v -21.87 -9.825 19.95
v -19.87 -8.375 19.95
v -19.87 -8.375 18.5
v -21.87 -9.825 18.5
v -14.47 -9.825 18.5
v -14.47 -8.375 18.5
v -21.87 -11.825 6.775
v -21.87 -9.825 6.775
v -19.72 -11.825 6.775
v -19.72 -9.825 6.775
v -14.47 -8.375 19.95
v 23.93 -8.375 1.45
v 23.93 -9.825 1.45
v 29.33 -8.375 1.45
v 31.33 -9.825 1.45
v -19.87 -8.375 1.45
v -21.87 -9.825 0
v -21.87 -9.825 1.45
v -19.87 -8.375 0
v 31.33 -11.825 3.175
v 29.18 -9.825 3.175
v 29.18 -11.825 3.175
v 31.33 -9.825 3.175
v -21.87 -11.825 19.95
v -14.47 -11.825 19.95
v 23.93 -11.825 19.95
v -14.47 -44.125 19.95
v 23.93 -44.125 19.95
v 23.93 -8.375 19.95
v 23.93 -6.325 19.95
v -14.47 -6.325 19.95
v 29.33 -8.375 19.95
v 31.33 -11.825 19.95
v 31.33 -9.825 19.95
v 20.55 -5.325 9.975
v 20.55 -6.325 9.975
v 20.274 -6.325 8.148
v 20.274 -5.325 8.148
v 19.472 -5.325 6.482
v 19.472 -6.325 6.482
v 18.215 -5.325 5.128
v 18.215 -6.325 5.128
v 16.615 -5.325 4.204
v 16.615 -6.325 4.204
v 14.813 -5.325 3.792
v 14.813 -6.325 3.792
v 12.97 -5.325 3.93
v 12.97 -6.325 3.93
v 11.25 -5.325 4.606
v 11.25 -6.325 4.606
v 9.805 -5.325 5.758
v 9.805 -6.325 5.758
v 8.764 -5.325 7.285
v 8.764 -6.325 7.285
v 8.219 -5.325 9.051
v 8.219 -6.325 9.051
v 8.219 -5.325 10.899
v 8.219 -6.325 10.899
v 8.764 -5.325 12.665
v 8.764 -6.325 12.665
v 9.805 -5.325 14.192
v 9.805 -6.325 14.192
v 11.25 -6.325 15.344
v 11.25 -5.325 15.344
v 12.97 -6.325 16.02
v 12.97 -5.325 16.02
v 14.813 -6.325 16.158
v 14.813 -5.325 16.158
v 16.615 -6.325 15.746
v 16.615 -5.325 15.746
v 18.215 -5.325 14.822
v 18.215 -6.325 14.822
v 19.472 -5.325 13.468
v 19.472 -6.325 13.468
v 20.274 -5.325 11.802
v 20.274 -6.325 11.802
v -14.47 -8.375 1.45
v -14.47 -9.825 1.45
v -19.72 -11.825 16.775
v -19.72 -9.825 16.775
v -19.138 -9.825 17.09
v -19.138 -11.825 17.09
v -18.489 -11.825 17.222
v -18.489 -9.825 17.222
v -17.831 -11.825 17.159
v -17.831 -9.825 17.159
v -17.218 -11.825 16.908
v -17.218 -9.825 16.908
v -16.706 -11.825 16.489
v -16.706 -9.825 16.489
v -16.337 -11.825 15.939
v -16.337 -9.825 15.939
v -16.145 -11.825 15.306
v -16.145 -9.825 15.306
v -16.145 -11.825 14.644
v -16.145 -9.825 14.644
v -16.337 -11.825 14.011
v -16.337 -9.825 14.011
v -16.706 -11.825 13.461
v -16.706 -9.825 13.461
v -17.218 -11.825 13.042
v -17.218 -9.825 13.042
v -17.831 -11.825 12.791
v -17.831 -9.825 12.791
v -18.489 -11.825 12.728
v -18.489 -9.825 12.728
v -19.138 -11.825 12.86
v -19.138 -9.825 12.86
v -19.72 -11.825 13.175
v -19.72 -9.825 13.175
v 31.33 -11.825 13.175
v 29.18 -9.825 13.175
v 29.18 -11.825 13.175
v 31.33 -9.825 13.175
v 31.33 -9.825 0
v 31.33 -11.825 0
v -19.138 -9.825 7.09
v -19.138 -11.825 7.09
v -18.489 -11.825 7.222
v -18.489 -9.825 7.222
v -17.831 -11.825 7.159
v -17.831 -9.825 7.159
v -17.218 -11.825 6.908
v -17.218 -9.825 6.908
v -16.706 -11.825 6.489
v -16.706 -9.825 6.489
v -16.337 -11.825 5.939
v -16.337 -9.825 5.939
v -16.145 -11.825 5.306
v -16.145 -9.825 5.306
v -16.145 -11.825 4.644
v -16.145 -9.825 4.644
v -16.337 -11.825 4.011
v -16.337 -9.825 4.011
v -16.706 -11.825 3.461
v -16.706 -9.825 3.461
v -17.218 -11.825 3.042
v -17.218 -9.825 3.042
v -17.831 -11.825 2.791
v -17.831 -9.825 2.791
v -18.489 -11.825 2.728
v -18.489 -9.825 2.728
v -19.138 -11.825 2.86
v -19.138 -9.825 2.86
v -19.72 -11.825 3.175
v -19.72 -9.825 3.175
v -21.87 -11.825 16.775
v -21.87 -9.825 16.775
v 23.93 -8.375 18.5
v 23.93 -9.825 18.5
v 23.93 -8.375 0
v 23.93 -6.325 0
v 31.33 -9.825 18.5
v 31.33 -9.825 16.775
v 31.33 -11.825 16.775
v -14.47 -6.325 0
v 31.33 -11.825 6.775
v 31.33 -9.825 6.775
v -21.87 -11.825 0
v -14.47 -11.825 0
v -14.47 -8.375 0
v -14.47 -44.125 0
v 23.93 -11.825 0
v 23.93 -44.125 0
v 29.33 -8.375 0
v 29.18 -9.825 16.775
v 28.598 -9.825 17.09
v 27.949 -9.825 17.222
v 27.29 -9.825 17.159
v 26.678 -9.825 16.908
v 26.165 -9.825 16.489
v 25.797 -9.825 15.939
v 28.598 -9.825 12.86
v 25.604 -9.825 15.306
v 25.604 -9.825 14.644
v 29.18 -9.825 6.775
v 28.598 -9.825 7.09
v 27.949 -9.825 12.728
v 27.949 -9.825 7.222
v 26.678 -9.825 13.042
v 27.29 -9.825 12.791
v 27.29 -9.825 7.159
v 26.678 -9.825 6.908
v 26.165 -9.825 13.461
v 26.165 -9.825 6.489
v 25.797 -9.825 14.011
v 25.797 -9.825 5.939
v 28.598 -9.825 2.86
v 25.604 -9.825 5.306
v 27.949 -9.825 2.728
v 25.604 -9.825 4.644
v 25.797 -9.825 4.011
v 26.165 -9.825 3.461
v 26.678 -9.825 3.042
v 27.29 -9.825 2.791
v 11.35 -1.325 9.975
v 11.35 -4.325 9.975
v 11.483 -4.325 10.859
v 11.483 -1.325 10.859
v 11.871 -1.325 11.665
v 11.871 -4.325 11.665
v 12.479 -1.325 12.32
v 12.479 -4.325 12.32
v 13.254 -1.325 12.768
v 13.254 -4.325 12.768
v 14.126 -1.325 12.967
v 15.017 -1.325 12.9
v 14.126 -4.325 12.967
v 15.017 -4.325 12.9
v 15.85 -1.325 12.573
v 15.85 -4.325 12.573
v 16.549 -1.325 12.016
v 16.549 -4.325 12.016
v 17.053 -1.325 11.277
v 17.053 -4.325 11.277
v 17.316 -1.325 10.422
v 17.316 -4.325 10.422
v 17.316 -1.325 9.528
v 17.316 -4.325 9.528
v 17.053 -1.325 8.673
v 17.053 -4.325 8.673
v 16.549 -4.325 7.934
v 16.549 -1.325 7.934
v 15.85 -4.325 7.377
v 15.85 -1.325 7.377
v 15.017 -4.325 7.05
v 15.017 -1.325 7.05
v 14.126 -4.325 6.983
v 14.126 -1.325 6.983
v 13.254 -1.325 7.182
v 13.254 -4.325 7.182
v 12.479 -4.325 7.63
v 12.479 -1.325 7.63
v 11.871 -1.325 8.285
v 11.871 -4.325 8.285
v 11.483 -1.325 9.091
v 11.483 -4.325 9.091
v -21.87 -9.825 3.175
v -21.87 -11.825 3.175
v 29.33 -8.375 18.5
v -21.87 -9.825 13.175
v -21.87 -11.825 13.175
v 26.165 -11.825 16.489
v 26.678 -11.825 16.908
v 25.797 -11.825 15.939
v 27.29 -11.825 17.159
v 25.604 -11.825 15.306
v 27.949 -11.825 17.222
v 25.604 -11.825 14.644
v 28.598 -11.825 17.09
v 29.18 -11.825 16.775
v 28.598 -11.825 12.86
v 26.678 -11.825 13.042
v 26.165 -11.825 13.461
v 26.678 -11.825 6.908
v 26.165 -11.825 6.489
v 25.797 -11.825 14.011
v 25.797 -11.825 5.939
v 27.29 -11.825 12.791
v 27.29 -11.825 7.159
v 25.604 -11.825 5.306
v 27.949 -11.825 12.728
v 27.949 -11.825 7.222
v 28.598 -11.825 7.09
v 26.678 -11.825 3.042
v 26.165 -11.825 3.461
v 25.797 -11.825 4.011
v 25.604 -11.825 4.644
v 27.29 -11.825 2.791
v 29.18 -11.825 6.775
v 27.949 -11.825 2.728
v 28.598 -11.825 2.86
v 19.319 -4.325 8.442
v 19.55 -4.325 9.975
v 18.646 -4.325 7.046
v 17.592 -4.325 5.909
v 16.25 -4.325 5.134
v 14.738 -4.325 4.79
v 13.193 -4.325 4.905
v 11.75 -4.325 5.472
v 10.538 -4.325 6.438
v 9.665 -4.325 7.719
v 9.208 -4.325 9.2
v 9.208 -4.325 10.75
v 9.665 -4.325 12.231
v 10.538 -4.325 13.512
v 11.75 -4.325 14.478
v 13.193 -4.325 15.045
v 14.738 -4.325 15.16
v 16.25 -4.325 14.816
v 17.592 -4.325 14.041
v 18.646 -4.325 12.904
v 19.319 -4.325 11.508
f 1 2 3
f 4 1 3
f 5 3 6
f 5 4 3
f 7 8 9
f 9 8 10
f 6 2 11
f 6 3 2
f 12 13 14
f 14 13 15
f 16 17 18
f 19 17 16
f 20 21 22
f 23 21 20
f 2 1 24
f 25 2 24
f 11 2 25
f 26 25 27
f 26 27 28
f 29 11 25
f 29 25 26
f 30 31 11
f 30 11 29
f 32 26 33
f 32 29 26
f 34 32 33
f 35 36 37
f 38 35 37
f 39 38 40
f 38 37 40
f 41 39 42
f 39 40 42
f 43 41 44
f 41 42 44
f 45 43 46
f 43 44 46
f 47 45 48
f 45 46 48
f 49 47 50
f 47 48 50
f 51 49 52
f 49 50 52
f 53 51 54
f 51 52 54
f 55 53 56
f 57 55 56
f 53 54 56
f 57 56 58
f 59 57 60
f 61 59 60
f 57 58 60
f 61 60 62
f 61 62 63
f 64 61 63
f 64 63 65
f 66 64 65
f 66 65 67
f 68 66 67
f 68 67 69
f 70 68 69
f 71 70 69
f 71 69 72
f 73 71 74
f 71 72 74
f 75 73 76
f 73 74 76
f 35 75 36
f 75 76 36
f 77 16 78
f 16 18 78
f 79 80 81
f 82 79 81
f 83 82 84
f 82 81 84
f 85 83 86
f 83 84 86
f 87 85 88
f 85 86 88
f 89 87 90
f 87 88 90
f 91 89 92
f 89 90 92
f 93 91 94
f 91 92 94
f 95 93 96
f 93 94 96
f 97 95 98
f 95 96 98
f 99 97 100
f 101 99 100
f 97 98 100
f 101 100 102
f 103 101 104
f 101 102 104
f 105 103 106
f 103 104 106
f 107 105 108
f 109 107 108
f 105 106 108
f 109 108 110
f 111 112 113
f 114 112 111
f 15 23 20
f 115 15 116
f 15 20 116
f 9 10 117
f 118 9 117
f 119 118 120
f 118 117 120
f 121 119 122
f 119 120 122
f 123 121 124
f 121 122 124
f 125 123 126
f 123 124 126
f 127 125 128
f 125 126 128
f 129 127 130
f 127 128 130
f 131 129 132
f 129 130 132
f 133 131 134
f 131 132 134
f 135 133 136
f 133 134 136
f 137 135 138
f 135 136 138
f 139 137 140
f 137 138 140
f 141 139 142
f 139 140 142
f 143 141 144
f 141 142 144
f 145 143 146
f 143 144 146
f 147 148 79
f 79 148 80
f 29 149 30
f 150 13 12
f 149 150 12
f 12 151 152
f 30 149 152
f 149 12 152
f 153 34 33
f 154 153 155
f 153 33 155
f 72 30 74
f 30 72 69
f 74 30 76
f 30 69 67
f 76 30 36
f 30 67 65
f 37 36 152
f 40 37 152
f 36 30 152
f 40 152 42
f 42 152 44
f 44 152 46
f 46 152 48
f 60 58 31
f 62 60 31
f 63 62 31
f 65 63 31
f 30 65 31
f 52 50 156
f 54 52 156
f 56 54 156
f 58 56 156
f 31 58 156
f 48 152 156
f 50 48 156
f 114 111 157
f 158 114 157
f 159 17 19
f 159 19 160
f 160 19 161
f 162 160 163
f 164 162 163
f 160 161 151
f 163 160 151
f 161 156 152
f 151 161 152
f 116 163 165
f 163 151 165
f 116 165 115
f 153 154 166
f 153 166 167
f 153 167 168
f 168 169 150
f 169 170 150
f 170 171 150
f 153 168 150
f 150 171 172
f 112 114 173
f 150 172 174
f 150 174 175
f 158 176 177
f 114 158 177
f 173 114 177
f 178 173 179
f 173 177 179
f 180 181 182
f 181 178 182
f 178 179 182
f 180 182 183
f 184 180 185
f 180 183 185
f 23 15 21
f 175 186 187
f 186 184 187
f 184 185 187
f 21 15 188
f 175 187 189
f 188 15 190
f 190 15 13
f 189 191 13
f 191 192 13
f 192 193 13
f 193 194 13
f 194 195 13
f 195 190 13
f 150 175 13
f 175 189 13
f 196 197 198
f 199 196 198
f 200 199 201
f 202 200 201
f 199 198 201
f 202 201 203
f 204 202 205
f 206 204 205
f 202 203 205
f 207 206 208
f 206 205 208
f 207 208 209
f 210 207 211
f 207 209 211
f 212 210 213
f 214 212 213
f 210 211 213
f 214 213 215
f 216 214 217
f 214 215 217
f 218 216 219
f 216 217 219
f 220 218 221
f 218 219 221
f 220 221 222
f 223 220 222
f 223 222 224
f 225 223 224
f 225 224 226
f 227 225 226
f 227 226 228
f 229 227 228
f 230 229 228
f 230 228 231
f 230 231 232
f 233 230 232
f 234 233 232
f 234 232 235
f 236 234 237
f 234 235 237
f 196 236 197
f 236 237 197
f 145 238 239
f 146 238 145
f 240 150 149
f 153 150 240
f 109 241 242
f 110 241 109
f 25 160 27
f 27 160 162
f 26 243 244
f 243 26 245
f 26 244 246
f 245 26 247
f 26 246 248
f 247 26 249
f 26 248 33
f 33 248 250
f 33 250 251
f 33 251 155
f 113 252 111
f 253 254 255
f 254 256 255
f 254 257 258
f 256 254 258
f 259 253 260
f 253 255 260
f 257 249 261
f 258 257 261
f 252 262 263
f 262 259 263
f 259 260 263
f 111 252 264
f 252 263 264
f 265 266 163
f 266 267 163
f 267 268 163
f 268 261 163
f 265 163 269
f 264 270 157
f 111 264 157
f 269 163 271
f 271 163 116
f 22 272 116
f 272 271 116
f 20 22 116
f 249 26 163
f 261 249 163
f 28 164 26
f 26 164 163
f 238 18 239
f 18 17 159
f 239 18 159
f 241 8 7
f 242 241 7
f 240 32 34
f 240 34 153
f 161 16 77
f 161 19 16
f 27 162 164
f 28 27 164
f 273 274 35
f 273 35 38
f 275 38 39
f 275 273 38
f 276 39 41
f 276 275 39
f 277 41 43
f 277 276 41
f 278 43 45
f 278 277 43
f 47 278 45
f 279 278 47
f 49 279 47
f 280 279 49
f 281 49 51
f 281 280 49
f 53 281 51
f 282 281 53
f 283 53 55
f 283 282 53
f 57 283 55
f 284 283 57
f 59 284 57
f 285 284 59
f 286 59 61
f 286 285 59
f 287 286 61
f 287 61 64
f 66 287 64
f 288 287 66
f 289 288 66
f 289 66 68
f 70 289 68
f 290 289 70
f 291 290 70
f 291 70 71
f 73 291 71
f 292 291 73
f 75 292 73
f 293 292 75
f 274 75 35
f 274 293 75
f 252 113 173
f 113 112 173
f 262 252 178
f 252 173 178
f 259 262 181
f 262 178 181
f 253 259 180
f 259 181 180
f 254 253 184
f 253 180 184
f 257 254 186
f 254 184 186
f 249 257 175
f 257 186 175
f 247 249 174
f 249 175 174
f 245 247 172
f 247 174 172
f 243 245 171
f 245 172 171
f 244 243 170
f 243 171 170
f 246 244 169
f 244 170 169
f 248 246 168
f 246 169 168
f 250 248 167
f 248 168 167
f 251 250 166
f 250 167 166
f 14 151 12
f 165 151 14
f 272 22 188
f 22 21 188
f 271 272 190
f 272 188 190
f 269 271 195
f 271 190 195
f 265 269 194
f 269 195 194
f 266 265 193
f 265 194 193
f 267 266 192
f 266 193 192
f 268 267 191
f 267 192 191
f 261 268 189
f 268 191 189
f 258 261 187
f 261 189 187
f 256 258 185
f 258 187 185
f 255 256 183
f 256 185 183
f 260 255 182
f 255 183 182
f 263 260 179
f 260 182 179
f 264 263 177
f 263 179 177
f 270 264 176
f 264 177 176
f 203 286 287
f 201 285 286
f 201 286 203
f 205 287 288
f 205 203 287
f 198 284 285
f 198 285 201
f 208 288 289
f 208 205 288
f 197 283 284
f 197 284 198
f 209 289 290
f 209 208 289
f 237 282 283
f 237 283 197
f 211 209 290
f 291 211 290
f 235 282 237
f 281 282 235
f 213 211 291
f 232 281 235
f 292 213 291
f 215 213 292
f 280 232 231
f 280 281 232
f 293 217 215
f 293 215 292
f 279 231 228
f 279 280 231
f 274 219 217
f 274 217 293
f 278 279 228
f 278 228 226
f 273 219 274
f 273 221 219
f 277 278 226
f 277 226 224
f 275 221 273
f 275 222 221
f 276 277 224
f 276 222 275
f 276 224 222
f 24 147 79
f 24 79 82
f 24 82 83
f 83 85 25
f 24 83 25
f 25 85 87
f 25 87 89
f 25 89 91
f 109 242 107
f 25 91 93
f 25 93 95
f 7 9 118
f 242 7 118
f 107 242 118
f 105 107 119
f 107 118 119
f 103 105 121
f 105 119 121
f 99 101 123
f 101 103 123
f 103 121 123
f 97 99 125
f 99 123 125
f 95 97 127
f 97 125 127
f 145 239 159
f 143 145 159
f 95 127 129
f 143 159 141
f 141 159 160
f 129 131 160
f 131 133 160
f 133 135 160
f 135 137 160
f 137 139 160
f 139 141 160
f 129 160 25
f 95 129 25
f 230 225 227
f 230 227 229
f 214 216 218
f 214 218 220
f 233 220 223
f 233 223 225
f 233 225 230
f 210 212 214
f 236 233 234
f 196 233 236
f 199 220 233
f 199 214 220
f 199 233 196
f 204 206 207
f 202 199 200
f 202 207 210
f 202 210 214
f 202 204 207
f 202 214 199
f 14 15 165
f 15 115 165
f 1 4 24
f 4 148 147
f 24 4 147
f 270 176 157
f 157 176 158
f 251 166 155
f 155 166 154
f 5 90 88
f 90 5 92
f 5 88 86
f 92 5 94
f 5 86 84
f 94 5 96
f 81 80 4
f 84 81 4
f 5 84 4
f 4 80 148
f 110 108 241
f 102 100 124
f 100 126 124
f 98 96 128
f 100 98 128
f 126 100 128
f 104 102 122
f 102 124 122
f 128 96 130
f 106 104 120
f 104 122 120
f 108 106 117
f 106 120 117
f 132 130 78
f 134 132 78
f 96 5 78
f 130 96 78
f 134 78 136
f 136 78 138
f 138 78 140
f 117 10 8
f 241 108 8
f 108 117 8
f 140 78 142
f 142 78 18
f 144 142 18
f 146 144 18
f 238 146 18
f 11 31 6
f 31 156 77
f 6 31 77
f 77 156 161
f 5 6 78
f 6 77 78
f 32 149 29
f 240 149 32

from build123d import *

# Parameters (mm, degrees)
EXTRUDE_1_DEPTH     = 19.95
SKETCH_2_W          = 7.4
SKETCH_2_H          = 1.45
EXTRUDE_2_DEPTH     = 1.45
CHAMFER_1_SIZE      = 1.45
CHAMFER_1_SIZE2     = 2
CHAMFER_3_SIZE      = 1.45
CHAMFER_3_SIZE2     = 2
CHAMFER_4_SIZE      = 1.45
CHAMFER_4_SIZE2     = 2
CHAMFER_5_SIZE      = 1.45
CHAMFER_5_SIZE2     = 2
SKETCH_3_R          = 2.25
CUT_EXTRUDE_1_DEPTH = 2
SKETCH_4_W          = 2.602143293
SKETCH_4_H          = 3.6
SKETCH_4_W_2        = 2.852203288
CUT_EXTRUDE_2_DEPTH = 2
SKETCH_5_R          = 6.2
EXTRUDE_3_DEPTH     = 2
CHAMFER_6_SIZE      = 1
SKETCH_6_R          = 3
EXTRUDE_4_DEPTH     = 3


with BuildPart() as part:
    # 草圖1 → 填料-伸長1 (new body)
    with BuildSketch(Plane.XY):
        Polygon((-14.470198675, -11.825165563), (-14.470198675, -44.125165563), (23.929801325, -44.125165563), (23.929801325, -11.825165563), (31.329801325, -11.825165563), (31.329801325, -9.825165563), (23.929801325, -9.825165563), (23.929801325, -6.325165563), (-14.470198675, -6.325165563), (-14.470198675, -9.825165563), (-21.870198675, -9.825165563), (-21.870198675, -11.825165563), align=None)
    extrude(amount=EXTRUDE_1_DEPTH)

    # 草圖2 → 填料-伸長2 (add)
    with BuildSketch(Plane(origin=(0, -9.825165563, 0), x_dir=(1, 0, 0), z_dir=(0, 1, 0))):
        with Locations((27.629801325, -0.725)):
            Rectangle(SKETCH_2_W, SKETCH_2_H)
        with Locations((27.629801325, -19.225)):
            Rectangle(SKETCH_2_W, SKETCH_2_H)
        with Locations((-18.170198675, -0.725)):
            Rectangle(SKETCH_2_W, SKETCH_2_H)
        with Locations((-18.170198675, -19.225)):
            Rectangle(SKETCH_2_W, SKETCH_2_H)
    extrude(amount=EXTRUDE_2_DEPTH)

    # 導角1
    chamfer_1_edges = [part.edges().sort_by_distance(p)[0] for p in [
        (31.329801325, -8.375165563, 19.225),
    ]]
    chamfer_1_side = [part.faces().sort_by_distance(p)[0] for p in [
        (31.329801325, -10.660702917, 9.975),
    ]]
    chamfer(chamfer_1_edges, length=CHAMFER_1_SIZE, length2=CHAMFER_1_SIZE2, reference=chamfer_1_side[0])

    # 導角3
    chamfer_3_edges = [part.edges().sort_by_distance(p)[0] for p in [
        (31.329801325, -8.375165563, 0.725),
    ]]
    chamfer_3_side = [part.faces().sort_by_distance(p)[0] for p in [
        (31.329801325, -10.738818024, 9.511976966),
    ]]
    chamfer(chamfer_3_edges, length=CHAMFER_3_SIZE, length2=CHAMFER_3_SIZE2, reference=chamfer_3_side[0])

    # 導角4
    chamfer_4_edges = [part.edges().sort_by_distance(p)[0] for p in [
        (-21.870198675, -8.375165563, 19.225),
    ]]
    chamfer_4_side = [part.faces().sort_by_distance(p)[0] for p in [
        (-21.870198675, -10.660702917, 9.975),
    ]]
    chamfer(chamfer_4_edges, length=CHAMFER_4_SIZE, length2=CHAMFER_4_SIZE2, reference=chamfer_4_side[0])

    # 導角5
    chamfer_5_edges = [part.edges().sort_by_distance(p)[0] for p in [
        (-21.870198675, -8.375165563, 0.725),
    ]]
    chamfer_5_side = [part.faces().sort_by_distance(p)[0] for p in [
        (-21.870198675, -10.738818024, 9.511976966),
    ]]
    chamfer(chamfer_5_edges, length=CHAMFER_5_SIZE, length2=CHAMFER_5_SIZE2, reference=chamfer_5_side[0])

    # 草圖3 → 除料-伸長1 (cut)
    with BuildSketch(Plane(origin=(0, -9.825165563, 0), x_dir=(1, 0, 0), z_dir=(0, 1, 0))):
        with Locations(Location((-18.370198675, -4.975, 0), (0, 0, 180))):
            Circle(SKETCH_3_R)
        with Locations(Location((-18.370198675, -14.975, 0), (0, 0, 180))):
            Circle(SKETCH_3_R)
        with Locations(Location((27.829801325, -14.975, 0), (0, 0, 180))):
            Circle(SKETCH_3_R)
        with Locations(Location((27.829801325, -4.975, 0), (0, 0, 180))):
            Circle(SKETCH_3_R)
    extrude(amount=-CUT_EXTRUDE_1_DEPTH, mode=Mode.SUBTRACT)

    # 草圖4 → 除料-伸長2 (cut)
    with BuildSketch(Plane(origin=(0, -9.825165563, 0), x_dir=(1, 0, 0), z_dir=(0, 1, 0))):
        with Locations((-20.569127028, -14.975)):
            Rectangle(SKETCH_4_W, SKETCH_4_H)
        with Locations((-20.569127028, -4.975)):
            Rectangle(SKETCH_4_W, SKETCH_4_H)
        with Locations((29.903699681, -14.975)):
            Rectangle(SKETCH_4_W_2, SKETCH_4_H)
        with Locations((29.903699681, -4.975)):
            Rectangle(SKETCH_4_W_2, SKETCH_4_H)
    extrude(amount=-CUT_EXTRUDE_2_DEPTH, mode=Mode.SUBTRACT)

    # 草圖5 → 填料-伸長3 (add)
    with BuildSketch(Plane(origin=(0, -6.325165563, 0), x_dir=(1, 0, 0), z_dir=(0, 1, 0))):
        with Locations((14.349801325, -9.975)):
            Circle(SKETCH_5_R)
    extrude(amount=EXTRUDE_3_DEPTH)

    # 導角6
    chamfer_6_edges = [part.edges().sort_by_distance(p)[0] for p in [
        (8.149801325, -4.325165563, 9.975),
    ]]
    chamfer(chamfer_6_edges, length=CHAMFER_6_SIZE)

    # 草圖6 → 填料-伸長4 (add)
    with BuildSketch(Plane(origin=(0, -4.325165563, 0), x_dir=(1, 0, 0), z_dir=(0, 1, 0))):
        with Locations(Location((14.349801325, -9.975, 0), (0, 0, 180))):
            Circle(SKETCH_6_R)
    extrude(amount=EXTRUDE_4_DEPTH)


solid = part.part
